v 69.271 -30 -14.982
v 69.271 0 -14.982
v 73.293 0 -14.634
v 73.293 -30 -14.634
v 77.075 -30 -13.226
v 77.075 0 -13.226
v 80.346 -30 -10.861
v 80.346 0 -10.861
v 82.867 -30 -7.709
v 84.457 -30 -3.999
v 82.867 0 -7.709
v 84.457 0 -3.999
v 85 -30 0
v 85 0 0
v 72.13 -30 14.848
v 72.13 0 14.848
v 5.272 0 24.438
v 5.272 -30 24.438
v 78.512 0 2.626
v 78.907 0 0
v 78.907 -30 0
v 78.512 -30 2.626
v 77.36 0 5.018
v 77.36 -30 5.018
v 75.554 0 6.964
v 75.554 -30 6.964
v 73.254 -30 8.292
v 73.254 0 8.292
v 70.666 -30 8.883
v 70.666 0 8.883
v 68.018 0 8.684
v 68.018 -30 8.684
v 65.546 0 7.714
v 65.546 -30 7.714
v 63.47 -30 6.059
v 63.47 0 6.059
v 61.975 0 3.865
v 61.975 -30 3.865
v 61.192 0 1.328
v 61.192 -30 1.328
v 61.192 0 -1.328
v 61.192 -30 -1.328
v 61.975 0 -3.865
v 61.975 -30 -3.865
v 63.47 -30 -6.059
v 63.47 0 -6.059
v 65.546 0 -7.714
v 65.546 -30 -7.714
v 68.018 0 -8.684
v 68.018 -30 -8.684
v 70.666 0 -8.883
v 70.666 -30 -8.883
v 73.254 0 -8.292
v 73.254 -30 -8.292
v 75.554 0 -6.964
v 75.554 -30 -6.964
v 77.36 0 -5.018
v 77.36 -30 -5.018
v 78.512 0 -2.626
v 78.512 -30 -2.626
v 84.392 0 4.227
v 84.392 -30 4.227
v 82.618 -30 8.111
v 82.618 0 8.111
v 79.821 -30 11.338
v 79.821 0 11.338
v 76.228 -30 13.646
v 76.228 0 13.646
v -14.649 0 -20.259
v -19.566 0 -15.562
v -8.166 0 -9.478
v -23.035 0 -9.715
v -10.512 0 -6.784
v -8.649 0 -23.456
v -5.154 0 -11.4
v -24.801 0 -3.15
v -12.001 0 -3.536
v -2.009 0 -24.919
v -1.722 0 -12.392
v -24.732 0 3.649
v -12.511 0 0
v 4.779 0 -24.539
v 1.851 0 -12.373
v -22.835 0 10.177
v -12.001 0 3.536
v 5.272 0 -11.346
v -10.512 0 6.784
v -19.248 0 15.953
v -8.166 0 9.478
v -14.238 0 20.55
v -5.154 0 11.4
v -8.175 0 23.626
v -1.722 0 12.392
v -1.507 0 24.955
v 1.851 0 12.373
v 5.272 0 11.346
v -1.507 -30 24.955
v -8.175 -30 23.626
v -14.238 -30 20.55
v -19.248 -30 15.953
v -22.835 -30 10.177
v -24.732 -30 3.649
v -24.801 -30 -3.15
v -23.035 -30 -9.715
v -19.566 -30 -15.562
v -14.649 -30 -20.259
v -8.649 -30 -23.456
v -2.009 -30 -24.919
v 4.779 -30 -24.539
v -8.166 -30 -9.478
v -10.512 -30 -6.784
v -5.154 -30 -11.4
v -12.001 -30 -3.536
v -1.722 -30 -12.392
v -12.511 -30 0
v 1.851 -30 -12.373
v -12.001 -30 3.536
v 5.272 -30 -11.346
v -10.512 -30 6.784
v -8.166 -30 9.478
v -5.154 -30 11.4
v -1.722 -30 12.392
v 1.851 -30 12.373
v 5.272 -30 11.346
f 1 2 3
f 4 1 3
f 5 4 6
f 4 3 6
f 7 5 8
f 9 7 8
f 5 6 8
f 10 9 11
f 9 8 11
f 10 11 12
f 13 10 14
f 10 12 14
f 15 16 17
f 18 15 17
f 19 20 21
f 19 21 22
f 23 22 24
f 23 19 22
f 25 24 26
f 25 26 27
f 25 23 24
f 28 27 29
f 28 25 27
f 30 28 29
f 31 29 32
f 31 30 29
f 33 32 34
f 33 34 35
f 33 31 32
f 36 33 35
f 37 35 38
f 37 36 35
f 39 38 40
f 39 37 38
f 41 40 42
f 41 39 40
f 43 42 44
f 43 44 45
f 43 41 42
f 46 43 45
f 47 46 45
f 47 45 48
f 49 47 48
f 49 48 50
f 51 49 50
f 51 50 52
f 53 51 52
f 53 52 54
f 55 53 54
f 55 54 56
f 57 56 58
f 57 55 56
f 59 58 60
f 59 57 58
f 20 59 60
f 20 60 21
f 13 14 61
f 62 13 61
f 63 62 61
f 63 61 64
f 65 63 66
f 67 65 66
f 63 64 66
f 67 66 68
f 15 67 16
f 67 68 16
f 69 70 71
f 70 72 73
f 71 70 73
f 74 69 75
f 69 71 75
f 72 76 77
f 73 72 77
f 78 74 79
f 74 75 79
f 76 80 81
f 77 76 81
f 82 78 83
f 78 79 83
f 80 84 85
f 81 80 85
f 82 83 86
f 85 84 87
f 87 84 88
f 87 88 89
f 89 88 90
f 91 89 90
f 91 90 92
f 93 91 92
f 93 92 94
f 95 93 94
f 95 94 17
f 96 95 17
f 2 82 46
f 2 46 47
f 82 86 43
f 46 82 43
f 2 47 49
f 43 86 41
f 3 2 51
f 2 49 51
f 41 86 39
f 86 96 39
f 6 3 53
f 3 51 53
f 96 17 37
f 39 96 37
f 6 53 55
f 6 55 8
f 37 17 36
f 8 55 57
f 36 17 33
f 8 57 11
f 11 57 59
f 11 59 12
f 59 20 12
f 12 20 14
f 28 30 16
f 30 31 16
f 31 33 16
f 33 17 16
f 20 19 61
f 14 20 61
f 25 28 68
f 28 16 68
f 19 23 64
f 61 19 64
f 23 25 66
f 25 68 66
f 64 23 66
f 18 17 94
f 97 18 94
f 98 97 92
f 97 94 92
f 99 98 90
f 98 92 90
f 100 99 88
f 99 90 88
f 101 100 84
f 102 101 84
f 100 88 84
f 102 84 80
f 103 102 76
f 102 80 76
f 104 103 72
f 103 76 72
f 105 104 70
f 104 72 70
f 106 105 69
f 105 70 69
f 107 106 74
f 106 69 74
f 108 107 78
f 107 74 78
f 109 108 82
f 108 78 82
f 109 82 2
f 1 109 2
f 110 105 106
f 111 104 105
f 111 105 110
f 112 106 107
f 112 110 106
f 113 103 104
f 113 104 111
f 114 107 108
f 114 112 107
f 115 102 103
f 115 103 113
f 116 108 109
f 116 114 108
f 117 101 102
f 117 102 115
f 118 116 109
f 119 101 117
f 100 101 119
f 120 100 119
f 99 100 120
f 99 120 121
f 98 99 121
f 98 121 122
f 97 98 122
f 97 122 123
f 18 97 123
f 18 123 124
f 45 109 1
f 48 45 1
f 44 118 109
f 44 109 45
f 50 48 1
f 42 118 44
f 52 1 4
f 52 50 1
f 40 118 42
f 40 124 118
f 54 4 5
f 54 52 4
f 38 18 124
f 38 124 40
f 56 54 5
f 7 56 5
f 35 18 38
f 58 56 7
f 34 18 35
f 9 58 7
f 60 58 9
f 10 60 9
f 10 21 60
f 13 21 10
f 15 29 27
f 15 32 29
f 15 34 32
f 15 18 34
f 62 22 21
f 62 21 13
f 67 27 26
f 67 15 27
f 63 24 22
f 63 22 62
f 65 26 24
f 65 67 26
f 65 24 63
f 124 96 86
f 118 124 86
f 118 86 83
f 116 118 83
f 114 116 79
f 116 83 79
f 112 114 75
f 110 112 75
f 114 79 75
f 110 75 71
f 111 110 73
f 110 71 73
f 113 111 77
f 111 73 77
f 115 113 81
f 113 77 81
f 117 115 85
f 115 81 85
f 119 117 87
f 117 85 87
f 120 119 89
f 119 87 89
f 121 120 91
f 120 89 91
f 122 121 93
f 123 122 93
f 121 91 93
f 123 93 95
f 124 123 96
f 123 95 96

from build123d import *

# Parameters (mm, degrees)
F0_R     = 8.907425
F1_DEPTH = 30
F2_DEPTH = 30


with BuildPart() as f1:
    # F0 (on Front) → F1 (new body)
    with BuildSketch(Plane.XZ):
        with BuildLine():
            ThreePointArc((4.778965, -24.538979), (19.293446, -15.89852), (25, 0))
            ThreePointArc((25, 0), (19.452619, 15.703364), (5.27235, 24.437723))
            ThreePointArc((5.27235, 24.437723), (-24.998732, 0.251834), (4.778965, -24.538979))
        make_face()
        with BuildLine():
            ThreePointArc((5.27235, 11.345945), (10.547302, 6.729233), (12.511121, 0))
            ThreePointArc((12.511121, 0), (10.547302, -6.729233), (5.27235, -11.345945))
            ThreePointArc((5.27235, -11.345945), (-12.511121, 0), (5.27235, 11.345945))
        make_face(mode=Mode.SUBTRACT)
        with BuildLine():
            ThreePointArc((5.27235, 24.437723), (19.452619, 15.703364), (25, 0))
            ThreePointArc((25, 0), (19.293446, -15.89852), (4.778965, -24.538979))
            Line((4.778965, -24.538979), (69.271411, -14.982295))
            ThreePointArc((69.271411, -14.982295), (55.068389, 1.430734), (72.129728, 14.848039))
            Line((72.129728, 14.848039), (5.27235, 24.437723))
        make_face()
        with BuildLine():
            ThreePointArc((85, 0), (81.334591, 9.824818), (72.129728, 14.848039))
            ThreePointArc((72.129728, 14.848039), (55.068389, 1.430734), (69.271411, -14.982295))
            ThreePointArc((69.271411, -14.982295), (80.3458, -10.861143), (85, 0))
        make_face()
        with Locations((70, 0)):
            Circle(F0_R, mode=Mode.SUBTRACT)
    extrude(amount=F1_DEPTH)

    # F0 (on Front) → F2 (join)
    with BuildSketch(Plane.XZ):
        with BuildLine():
            ThreePointArc((5.27235, -11.345945), (10.547302, -6.729233), (12.511121, 0))
            ThreePointArc((12.511121, 0), (10.547302, 6.729233), (5.27235, 11.345945))
            Line((5.27235, 11.345945), (5.27235, -11.345945))
        make_face()
    extrude(amount=F2_DEPTH)


solid = f1.part
